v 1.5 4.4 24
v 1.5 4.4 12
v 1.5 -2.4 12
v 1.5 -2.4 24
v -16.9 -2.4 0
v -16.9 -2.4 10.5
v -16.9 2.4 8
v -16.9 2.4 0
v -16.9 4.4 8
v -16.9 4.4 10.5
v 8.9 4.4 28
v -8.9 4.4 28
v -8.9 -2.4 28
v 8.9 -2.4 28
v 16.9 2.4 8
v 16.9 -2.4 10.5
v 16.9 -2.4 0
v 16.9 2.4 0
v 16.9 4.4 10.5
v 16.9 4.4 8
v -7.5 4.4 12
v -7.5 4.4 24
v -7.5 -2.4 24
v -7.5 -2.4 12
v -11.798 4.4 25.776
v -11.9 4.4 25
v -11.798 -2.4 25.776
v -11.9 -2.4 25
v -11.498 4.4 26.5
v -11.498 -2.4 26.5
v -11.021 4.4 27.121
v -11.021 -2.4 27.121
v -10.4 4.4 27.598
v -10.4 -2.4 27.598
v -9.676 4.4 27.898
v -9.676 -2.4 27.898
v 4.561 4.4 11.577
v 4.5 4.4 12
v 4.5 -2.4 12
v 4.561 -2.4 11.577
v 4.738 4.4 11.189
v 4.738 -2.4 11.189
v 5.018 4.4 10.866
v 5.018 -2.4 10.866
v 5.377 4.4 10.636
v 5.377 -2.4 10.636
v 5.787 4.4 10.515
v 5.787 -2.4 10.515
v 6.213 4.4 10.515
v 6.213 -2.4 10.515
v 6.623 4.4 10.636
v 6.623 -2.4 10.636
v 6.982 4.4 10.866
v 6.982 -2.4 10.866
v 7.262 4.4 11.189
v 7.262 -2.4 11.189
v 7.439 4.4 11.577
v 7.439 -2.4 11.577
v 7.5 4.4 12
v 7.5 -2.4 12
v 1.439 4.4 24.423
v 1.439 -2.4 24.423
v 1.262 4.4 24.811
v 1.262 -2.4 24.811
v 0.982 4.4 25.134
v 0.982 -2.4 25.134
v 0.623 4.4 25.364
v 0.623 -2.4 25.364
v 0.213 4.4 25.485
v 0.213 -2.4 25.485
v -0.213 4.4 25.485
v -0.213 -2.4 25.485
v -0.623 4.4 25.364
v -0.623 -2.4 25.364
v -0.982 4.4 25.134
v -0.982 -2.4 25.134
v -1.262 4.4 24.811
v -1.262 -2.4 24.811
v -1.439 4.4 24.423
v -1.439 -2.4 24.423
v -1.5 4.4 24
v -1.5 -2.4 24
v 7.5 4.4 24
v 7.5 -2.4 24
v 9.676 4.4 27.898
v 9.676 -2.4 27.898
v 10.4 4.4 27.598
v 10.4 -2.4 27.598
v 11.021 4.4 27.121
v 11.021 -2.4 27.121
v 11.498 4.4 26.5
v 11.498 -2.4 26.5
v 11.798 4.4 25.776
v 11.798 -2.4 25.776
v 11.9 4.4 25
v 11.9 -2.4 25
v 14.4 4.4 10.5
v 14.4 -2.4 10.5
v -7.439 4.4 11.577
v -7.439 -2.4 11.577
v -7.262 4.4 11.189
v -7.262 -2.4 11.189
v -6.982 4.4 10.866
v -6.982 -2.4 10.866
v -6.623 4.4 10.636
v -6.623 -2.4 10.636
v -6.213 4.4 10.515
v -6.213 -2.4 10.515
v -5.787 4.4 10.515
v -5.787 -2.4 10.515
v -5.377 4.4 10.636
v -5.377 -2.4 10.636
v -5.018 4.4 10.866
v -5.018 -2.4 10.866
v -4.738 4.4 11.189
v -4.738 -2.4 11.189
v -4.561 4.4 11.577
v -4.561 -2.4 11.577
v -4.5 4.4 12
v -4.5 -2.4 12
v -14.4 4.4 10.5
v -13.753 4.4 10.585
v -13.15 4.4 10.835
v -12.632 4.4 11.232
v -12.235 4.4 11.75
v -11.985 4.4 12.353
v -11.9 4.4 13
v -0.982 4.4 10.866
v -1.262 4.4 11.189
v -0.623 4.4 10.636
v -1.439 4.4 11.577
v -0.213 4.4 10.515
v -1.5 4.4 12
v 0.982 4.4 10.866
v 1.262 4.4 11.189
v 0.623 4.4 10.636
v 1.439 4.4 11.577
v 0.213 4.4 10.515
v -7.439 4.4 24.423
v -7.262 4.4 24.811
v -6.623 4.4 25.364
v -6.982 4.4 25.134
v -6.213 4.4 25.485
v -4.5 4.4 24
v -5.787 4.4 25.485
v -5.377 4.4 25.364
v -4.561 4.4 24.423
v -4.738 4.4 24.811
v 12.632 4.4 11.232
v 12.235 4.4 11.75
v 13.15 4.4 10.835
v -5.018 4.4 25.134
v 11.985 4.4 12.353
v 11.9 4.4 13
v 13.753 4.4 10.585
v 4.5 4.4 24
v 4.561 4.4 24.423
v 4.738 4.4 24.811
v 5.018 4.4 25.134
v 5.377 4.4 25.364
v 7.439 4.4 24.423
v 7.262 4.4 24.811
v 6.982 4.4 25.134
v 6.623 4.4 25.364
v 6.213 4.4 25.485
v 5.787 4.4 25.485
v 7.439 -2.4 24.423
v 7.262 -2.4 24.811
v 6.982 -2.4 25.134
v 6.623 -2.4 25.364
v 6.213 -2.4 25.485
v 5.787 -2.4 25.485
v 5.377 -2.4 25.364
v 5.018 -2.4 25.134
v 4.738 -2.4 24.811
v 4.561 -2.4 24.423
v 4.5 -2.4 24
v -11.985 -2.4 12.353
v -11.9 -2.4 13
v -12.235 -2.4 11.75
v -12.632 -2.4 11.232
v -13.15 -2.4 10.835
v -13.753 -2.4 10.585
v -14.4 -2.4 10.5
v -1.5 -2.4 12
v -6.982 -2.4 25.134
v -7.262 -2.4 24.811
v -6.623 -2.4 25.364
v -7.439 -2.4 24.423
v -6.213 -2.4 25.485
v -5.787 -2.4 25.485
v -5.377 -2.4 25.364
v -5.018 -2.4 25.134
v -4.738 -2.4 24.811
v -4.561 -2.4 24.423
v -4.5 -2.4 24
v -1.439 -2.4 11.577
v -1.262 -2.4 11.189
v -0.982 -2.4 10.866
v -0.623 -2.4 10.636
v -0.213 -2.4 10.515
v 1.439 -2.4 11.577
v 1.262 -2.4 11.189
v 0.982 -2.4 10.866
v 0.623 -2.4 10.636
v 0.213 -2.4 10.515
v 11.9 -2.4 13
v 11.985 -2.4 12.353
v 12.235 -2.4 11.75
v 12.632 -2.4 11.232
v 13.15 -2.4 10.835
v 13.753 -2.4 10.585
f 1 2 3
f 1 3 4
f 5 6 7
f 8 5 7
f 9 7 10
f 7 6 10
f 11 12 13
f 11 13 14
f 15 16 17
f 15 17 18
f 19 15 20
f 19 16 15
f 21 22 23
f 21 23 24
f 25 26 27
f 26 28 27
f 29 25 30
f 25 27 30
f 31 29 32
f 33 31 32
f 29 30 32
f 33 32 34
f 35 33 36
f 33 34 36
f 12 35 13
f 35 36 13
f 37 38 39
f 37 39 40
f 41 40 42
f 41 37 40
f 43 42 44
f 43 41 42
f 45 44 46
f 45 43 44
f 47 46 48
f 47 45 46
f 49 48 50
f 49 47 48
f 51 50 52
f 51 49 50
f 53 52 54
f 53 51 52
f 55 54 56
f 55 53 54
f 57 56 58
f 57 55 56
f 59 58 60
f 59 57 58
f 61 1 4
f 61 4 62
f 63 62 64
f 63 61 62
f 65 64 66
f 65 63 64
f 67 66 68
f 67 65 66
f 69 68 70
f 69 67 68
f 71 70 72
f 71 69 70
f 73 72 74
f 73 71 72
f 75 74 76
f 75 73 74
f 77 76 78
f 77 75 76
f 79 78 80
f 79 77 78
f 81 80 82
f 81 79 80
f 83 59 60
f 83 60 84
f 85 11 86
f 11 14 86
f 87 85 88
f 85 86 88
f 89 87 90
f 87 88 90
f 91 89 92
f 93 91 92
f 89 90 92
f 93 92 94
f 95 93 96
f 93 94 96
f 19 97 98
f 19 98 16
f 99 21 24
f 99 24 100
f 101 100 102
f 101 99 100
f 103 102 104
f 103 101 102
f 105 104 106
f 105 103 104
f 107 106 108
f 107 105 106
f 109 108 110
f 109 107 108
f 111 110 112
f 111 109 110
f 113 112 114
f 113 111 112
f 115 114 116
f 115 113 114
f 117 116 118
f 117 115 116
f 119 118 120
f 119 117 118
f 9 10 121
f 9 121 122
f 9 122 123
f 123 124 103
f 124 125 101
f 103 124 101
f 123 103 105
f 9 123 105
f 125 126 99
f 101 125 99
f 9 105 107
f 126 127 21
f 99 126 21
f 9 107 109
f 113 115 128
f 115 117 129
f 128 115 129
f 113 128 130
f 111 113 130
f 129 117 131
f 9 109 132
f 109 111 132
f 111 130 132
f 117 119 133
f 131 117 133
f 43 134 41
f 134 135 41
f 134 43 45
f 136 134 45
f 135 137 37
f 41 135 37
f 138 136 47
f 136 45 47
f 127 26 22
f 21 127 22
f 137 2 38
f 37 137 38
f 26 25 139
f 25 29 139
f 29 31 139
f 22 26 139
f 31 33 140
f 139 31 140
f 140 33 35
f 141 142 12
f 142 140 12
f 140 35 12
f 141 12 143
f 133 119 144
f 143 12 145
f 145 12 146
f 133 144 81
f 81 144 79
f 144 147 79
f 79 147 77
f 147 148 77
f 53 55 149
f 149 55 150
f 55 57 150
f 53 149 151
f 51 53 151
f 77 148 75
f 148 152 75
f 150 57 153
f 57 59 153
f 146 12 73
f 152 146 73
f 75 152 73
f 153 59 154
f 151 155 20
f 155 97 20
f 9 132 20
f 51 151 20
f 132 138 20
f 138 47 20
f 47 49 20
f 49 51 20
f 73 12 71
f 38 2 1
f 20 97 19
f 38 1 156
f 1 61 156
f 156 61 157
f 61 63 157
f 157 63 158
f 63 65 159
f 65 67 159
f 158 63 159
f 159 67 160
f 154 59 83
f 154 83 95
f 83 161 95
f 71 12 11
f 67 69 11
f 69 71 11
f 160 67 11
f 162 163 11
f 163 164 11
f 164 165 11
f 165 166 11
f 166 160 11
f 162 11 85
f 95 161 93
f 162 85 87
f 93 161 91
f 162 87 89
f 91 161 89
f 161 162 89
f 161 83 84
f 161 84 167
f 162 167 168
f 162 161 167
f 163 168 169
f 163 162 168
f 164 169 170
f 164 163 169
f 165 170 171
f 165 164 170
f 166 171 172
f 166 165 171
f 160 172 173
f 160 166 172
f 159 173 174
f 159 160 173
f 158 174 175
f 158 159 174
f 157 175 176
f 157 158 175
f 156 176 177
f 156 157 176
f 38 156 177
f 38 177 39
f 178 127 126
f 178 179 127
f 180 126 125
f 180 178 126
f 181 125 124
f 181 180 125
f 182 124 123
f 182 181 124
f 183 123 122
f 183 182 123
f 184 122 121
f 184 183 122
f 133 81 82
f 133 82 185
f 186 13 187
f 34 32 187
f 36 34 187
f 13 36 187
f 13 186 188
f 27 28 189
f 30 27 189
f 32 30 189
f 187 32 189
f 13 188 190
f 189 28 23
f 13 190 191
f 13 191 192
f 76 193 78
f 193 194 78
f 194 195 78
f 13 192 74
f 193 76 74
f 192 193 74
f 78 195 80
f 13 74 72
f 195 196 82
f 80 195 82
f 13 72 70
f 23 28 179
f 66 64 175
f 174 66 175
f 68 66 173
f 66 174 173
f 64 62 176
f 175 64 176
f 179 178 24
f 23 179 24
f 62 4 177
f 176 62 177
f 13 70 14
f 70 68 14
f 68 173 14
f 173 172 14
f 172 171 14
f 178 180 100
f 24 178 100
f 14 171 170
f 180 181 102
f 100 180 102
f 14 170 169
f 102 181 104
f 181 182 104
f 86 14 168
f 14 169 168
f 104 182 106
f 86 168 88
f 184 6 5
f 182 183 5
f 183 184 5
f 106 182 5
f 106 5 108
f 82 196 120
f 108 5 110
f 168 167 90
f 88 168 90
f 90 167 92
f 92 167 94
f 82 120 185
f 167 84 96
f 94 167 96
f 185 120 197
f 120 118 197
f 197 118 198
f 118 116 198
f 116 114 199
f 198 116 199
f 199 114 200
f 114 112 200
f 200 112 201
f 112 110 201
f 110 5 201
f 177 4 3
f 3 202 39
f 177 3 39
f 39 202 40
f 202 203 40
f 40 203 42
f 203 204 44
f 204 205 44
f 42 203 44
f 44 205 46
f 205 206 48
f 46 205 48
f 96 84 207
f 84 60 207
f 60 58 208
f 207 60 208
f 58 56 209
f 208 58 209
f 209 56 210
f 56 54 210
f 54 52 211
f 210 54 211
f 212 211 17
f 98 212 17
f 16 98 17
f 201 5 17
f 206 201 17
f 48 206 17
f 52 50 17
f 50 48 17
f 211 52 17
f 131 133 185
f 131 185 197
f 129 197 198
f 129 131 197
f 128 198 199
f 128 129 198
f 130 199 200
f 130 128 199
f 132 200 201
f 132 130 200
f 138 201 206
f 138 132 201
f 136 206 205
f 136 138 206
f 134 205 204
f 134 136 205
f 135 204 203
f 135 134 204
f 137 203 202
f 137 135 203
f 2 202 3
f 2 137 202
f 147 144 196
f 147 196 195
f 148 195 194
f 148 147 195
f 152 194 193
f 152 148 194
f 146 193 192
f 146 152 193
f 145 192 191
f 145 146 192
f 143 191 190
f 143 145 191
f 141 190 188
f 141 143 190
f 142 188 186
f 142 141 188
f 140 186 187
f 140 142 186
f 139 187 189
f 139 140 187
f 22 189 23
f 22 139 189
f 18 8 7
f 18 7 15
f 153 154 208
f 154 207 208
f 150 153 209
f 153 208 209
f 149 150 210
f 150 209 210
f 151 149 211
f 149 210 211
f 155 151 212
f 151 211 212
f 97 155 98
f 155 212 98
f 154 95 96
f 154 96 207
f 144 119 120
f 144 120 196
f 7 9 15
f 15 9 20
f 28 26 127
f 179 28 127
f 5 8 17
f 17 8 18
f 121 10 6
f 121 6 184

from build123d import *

# Parameters (mm, degrees)
SKETCH_1_W          = 33.8
SKETCH_1_H          = 4.8
EXTRUDE_1_DEPTH     = 28
SKETCH_2_W          = 33.8
SKETCH_2_H          = 2
EXTRUDE_2_DEPTH     = 20
CUT_EXTRUDE_1_DEPTH = 34.404341035
SKETCH_4_W          = 5
SKETCH_4_H          = 17.5
CUT_EXTRUDE_2_DEPTH = 34.404341035
FILLET_1_R          = 3
FILLET_3_R          = 2.5


with BuildPart() as part:
    # 草圖1 → 填料-伸長1 (new body)
    with BuildSketch(Plane.XY):
        Rectangle(SKETCH_1_W, SKETCH_1_H)
    extrude(amount=EXTRUDE_1_DEPTH)

    # 草圖2 → 填料-伸長2 (add)
    with BuildSketch(Plane.XY.offset(28)):
        with Locations((0, 3.4)):
            Rectangle(SKETCH_2_W, SKETCH_2_H)
    extrude(amount=-EXTRUDE_2_DEPTH)

    # 草圖3 → 除料-伸長1 (cut, through all)
    with BuildSketch(Plane(origin=(0, 4.4, 0), x_dir=(1, 0, 0), z_dir=(0, 1, 0))):
        with BuildLine():
            Line((1.5, -12), (1.5, -24))
            ThreePointArc((1.5, -24), (0, -25.5), (-1.5, -24))
            Line((-1.5, -24), (-1.5, -12))
            ThreePointArc((-1.5, -12), (0, -10.5), (1.5, -12))
        make_face()
        with BuildLine():
            Line((7.5, -12), (7.5, -24))
            ThreePointArc((7.5, -24), (6, -25.5), (4.5, -24))
            Line((4.5, -24), (4.5, -12))
            ThreePointArc((4.5, -12), (6, -10.5), (7.5, -12))
        make_face()
        with BuildLine():
            Line((-4.5, -12), (-4.5, -24))
            ThreePointArc((-4.5, -24), (-6, -25.5), (-7.5, -24))
            Line((-7.5, -24), (-7.5, -12))
            ThreePointArc((-7.5, -12), (-6, -10.5), (-4.5, -12))
        make_face()
    extrude(amount=-CUT_EXTRUDE_1_DEPTH, mode=Mode.SUBTRACT)

    # 草圖4 → 除料-伸長2 (cut, through all)
    with BuildSketch(Plane(origin=(0, 4.4, 0), x_dir=(1, 0, 0), z_dir=(0, 1, 0))):
        with Locations((-14.4, -19.25)):
            Rectangle(SKETCH_4_W, SKETCH_4_H)
        with Locations((14.4, -19.25)):
            Rectangle(SKETCH_4_W, SKETCH_4_H)
    extrude(amount=-CUT_EXTRUDE_2_DEPTH, mode=Mode.SUBTRACT)

    # 圓角1
    fillet_1_edges = [part.edges().sort_by_distance(p)[0] for p in [
        (-11.9, 1, 28),
        (11.9, 1, 28),
    ]]
    fillet(fillet_1_edges, radius=FILLET_1_R)

    # 圓角3
    fillet_3_edges = [part.edges().sort_by_distance(p)[0] for p in [
        (-11.9, 1, 10.5),
        (11.9, 1, 10.5),
    ]]
    fillet(fillet_3_edges, radius=FILLET_3_R)


solid = part.part
